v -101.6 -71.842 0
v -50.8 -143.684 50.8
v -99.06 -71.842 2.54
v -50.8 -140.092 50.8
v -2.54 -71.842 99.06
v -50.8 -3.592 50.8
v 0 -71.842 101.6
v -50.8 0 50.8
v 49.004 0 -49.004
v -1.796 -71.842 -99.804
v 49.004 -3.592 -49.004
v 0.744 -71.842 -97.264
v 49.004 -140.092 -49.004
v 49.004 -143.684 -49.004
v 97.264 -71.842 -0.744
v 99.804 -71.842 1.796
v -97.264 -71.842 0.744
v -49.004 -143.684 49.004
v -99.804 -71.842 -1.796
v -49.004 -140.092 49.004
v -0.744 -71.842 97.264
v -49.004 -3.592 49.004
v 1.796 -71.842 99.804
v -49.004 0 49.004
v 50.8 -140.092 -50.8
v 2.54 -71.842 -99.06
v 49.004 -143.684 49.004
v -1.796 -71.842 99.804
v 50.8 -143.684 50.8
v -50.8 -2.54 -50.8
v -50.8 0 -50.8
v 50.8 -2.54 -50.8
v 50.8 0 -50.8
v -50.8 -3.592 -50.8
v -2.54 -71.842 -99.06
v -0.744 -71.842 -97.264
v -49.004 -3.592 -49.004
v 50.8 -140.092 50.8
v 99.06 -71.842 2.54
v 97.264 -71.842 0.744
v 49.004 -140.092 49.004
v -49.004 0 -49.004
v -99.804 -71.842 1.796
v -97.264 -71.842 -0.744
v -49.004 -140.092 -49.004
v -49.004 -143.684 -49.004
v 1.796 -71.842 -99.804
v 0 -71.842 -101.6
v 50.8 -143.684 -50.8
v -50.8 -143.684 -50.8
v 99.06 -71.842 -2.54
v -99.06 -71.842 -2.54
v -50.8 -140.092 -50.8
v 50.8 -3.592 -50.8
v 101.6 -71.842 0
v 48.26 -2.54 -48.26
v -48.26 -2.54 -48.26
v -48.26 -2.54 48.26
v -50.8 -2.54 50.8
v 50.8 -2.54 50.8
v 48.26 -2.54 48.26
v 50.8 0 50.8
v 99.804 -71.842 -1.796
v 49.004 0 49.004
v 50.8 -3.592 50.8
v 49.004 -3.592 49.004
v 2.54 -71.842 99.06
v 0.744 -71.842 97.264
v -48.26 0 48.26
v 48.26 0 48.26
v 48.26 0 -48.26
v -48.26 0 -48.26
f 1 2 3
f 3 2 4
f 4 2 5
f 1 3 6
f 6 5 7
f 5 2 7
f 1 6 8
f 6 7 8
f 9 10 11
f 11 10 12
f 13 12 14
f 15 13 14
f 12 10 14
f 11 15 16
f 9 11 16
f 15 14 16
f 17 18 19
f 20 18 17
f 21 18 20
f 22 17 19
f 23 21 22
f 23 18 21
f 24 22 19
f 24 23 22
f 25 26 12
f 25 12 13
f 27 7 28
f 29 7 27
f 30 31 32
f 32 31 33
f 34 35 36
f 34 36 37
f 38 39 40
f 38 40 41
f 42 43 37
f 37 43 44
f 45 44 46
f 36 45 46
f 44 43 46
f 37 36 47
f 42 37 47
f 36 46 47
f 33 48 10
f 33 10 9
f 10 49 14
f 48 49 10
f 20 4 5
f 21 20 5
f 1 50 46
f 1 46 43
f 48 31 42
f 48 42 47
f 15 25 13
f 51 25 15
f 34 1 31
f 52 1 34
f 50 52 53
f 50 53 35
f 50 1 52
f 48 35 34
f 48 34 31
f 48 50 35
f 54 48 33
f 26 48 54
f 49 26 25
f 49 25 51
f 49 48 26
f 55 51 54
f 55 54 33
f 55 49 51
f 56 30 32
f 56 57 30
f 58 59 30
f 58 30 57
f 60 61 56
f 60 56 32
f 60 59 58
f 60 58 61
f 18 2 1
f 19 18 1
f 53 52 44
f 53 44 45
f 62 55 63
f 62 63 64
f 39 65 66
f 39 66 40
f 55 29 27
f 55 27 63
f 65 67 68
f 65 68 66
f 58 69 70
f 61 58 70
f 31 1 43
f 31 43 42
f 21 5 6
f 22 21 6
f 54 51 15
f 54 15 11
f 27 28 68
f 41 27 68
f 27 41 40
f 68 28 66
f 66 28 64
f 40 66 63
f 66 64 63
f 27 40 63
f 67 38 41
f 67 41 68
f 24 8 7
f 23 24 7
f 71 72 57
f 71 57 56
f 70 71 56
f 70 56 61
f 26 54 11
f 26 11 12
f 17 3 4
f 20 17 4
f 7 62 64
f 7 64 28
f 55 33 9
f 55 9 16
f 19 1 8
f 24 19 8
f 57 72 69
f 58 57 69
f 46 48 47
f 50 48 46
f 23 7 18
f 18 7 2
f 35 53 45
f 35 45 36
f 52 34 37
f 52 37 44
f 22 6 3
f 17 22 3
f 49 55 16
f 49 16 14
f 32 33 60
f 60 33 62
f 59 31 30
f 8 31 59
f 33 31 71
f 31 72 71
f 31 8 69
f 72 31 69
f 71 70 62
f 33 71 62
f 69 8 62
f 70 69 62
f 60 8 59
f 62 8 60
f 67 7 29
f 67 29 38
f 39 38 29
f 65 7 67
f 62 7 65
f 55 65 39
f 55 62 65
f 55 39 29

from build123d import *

# Parameters (mm, degrees)
F0_W      = 101.6
F0_H      = 101.6
F0_W_2    = 96.52
F0_H_2    = 96.52
F1_DEPTH  = 2.54
F4_DEPTH  = 2.54
F7_DEPTH  = 2.54
F10_DEPTH = 2.54
F13_DEPTH = 2.54


with BuildPart() as f1:
    # F0 (on Front) → F1 (new body)
    with BuildSketch(Plane.XZ):
        Rectangle(F0_W, F0_H)
        Rectangle(F0_W_2, F0_H_2, mode=Mode.SUBTRACT)
    extrude(amount=F1_DEPTH)


with BuildPart() as f4:
    # F3 (on face) → F4 (new body)
    with BuildSketch(Plane(origin=(50.8, 0, 50.8), x_dir=(0.7071067812, 0, -0.7071067812), z_dir=(0.7071067812, 0, 0.7071067812))):
        Polygon((71.8420489686, -71.8420489686), (0, 0), (-71.8420489686, -71.8420489686), (0, -143.6840979371), align=None)
        Polygon((0, -140.0919954887), (-68.2499465201, -71.8420489686), (0, -3.5921024484), (68.2499465201, -71.8420489686), align=None, mode=Mode.SUBTRACT)
    extrude(amount=-F4_DEPTH)


with BuildPart() as f7:
    # F6 (on 3pt) → F7 (new body)
    with BuildSketch(Plane(origin=(-50.8, 0, 50.8), x_dir=(0, 1, 0), z_dir=(0.7071067812, 0, -0.7071067812))):
        Polygon((0, 0), (-71.8420489686, 71.8420489686), (-143.6840979371, 0), (-71.8420489686, -71.8420489686), align=None)
        Polygon((-71.8420489686, -68.2499465201), (-140.0919954887, 0), (-71.8420489686, 68.2499465201), (-3.5921024484, 0), align=None, mode=Mode.SUBTRACT)
    extrude(amount=F7_DEPTH)


with BuildPart() as f10:
    # F9 (on 3pt) → F10 (new body)
    with BuildSketch(Plane(origin=(50.8, 0, -50.8), x_dir=(0.7071067812, 0, 0.7071067812), z_dir=(0.7071067812, 0, -0.7071067812))):
        Polygon((71.8420489686, 71.8420489686), (0, 143.6840979371), (-71.8420489686, 71.8420489686), (0, 0), align=None)
        Polygon((0, 3.5921024484), (-68.2499465201, 71.8420489686), (0, 140.0919954887), (68.2499465201, 71.8420489686), align=None, mode=Mode.SUBTRACT)
    extrude(amount=-F10_DEPTH)


with BuildPart() as f13:
    # F12 (on 3pt) → F13 (new body)
    with BuildSketch(Plane(origin=(-50.8, 0, -50.8), x_dir=(0.7071067812, 0, -0.7071067812), z_dir=(-0.7071067812, 0, -0.7071067812))):
        Polygon((71.8420489686, 71.8420489686), (0, 143.6840979371), (-71.8420489686, 71.8420489686), (0, 0), align=None)
        Polygon((0, 3.5921024484), (-68.2499465201, 71.8420489686), (0, 140.0919954887), (68.2499465201, 71.8420489686), align=None, mode=Mode.SUBTRACT)
    extrude(amount=-F13_DEPTH)


solid = Compound([f1.part, f4.part, f7.part, f10.part, f13.part])
